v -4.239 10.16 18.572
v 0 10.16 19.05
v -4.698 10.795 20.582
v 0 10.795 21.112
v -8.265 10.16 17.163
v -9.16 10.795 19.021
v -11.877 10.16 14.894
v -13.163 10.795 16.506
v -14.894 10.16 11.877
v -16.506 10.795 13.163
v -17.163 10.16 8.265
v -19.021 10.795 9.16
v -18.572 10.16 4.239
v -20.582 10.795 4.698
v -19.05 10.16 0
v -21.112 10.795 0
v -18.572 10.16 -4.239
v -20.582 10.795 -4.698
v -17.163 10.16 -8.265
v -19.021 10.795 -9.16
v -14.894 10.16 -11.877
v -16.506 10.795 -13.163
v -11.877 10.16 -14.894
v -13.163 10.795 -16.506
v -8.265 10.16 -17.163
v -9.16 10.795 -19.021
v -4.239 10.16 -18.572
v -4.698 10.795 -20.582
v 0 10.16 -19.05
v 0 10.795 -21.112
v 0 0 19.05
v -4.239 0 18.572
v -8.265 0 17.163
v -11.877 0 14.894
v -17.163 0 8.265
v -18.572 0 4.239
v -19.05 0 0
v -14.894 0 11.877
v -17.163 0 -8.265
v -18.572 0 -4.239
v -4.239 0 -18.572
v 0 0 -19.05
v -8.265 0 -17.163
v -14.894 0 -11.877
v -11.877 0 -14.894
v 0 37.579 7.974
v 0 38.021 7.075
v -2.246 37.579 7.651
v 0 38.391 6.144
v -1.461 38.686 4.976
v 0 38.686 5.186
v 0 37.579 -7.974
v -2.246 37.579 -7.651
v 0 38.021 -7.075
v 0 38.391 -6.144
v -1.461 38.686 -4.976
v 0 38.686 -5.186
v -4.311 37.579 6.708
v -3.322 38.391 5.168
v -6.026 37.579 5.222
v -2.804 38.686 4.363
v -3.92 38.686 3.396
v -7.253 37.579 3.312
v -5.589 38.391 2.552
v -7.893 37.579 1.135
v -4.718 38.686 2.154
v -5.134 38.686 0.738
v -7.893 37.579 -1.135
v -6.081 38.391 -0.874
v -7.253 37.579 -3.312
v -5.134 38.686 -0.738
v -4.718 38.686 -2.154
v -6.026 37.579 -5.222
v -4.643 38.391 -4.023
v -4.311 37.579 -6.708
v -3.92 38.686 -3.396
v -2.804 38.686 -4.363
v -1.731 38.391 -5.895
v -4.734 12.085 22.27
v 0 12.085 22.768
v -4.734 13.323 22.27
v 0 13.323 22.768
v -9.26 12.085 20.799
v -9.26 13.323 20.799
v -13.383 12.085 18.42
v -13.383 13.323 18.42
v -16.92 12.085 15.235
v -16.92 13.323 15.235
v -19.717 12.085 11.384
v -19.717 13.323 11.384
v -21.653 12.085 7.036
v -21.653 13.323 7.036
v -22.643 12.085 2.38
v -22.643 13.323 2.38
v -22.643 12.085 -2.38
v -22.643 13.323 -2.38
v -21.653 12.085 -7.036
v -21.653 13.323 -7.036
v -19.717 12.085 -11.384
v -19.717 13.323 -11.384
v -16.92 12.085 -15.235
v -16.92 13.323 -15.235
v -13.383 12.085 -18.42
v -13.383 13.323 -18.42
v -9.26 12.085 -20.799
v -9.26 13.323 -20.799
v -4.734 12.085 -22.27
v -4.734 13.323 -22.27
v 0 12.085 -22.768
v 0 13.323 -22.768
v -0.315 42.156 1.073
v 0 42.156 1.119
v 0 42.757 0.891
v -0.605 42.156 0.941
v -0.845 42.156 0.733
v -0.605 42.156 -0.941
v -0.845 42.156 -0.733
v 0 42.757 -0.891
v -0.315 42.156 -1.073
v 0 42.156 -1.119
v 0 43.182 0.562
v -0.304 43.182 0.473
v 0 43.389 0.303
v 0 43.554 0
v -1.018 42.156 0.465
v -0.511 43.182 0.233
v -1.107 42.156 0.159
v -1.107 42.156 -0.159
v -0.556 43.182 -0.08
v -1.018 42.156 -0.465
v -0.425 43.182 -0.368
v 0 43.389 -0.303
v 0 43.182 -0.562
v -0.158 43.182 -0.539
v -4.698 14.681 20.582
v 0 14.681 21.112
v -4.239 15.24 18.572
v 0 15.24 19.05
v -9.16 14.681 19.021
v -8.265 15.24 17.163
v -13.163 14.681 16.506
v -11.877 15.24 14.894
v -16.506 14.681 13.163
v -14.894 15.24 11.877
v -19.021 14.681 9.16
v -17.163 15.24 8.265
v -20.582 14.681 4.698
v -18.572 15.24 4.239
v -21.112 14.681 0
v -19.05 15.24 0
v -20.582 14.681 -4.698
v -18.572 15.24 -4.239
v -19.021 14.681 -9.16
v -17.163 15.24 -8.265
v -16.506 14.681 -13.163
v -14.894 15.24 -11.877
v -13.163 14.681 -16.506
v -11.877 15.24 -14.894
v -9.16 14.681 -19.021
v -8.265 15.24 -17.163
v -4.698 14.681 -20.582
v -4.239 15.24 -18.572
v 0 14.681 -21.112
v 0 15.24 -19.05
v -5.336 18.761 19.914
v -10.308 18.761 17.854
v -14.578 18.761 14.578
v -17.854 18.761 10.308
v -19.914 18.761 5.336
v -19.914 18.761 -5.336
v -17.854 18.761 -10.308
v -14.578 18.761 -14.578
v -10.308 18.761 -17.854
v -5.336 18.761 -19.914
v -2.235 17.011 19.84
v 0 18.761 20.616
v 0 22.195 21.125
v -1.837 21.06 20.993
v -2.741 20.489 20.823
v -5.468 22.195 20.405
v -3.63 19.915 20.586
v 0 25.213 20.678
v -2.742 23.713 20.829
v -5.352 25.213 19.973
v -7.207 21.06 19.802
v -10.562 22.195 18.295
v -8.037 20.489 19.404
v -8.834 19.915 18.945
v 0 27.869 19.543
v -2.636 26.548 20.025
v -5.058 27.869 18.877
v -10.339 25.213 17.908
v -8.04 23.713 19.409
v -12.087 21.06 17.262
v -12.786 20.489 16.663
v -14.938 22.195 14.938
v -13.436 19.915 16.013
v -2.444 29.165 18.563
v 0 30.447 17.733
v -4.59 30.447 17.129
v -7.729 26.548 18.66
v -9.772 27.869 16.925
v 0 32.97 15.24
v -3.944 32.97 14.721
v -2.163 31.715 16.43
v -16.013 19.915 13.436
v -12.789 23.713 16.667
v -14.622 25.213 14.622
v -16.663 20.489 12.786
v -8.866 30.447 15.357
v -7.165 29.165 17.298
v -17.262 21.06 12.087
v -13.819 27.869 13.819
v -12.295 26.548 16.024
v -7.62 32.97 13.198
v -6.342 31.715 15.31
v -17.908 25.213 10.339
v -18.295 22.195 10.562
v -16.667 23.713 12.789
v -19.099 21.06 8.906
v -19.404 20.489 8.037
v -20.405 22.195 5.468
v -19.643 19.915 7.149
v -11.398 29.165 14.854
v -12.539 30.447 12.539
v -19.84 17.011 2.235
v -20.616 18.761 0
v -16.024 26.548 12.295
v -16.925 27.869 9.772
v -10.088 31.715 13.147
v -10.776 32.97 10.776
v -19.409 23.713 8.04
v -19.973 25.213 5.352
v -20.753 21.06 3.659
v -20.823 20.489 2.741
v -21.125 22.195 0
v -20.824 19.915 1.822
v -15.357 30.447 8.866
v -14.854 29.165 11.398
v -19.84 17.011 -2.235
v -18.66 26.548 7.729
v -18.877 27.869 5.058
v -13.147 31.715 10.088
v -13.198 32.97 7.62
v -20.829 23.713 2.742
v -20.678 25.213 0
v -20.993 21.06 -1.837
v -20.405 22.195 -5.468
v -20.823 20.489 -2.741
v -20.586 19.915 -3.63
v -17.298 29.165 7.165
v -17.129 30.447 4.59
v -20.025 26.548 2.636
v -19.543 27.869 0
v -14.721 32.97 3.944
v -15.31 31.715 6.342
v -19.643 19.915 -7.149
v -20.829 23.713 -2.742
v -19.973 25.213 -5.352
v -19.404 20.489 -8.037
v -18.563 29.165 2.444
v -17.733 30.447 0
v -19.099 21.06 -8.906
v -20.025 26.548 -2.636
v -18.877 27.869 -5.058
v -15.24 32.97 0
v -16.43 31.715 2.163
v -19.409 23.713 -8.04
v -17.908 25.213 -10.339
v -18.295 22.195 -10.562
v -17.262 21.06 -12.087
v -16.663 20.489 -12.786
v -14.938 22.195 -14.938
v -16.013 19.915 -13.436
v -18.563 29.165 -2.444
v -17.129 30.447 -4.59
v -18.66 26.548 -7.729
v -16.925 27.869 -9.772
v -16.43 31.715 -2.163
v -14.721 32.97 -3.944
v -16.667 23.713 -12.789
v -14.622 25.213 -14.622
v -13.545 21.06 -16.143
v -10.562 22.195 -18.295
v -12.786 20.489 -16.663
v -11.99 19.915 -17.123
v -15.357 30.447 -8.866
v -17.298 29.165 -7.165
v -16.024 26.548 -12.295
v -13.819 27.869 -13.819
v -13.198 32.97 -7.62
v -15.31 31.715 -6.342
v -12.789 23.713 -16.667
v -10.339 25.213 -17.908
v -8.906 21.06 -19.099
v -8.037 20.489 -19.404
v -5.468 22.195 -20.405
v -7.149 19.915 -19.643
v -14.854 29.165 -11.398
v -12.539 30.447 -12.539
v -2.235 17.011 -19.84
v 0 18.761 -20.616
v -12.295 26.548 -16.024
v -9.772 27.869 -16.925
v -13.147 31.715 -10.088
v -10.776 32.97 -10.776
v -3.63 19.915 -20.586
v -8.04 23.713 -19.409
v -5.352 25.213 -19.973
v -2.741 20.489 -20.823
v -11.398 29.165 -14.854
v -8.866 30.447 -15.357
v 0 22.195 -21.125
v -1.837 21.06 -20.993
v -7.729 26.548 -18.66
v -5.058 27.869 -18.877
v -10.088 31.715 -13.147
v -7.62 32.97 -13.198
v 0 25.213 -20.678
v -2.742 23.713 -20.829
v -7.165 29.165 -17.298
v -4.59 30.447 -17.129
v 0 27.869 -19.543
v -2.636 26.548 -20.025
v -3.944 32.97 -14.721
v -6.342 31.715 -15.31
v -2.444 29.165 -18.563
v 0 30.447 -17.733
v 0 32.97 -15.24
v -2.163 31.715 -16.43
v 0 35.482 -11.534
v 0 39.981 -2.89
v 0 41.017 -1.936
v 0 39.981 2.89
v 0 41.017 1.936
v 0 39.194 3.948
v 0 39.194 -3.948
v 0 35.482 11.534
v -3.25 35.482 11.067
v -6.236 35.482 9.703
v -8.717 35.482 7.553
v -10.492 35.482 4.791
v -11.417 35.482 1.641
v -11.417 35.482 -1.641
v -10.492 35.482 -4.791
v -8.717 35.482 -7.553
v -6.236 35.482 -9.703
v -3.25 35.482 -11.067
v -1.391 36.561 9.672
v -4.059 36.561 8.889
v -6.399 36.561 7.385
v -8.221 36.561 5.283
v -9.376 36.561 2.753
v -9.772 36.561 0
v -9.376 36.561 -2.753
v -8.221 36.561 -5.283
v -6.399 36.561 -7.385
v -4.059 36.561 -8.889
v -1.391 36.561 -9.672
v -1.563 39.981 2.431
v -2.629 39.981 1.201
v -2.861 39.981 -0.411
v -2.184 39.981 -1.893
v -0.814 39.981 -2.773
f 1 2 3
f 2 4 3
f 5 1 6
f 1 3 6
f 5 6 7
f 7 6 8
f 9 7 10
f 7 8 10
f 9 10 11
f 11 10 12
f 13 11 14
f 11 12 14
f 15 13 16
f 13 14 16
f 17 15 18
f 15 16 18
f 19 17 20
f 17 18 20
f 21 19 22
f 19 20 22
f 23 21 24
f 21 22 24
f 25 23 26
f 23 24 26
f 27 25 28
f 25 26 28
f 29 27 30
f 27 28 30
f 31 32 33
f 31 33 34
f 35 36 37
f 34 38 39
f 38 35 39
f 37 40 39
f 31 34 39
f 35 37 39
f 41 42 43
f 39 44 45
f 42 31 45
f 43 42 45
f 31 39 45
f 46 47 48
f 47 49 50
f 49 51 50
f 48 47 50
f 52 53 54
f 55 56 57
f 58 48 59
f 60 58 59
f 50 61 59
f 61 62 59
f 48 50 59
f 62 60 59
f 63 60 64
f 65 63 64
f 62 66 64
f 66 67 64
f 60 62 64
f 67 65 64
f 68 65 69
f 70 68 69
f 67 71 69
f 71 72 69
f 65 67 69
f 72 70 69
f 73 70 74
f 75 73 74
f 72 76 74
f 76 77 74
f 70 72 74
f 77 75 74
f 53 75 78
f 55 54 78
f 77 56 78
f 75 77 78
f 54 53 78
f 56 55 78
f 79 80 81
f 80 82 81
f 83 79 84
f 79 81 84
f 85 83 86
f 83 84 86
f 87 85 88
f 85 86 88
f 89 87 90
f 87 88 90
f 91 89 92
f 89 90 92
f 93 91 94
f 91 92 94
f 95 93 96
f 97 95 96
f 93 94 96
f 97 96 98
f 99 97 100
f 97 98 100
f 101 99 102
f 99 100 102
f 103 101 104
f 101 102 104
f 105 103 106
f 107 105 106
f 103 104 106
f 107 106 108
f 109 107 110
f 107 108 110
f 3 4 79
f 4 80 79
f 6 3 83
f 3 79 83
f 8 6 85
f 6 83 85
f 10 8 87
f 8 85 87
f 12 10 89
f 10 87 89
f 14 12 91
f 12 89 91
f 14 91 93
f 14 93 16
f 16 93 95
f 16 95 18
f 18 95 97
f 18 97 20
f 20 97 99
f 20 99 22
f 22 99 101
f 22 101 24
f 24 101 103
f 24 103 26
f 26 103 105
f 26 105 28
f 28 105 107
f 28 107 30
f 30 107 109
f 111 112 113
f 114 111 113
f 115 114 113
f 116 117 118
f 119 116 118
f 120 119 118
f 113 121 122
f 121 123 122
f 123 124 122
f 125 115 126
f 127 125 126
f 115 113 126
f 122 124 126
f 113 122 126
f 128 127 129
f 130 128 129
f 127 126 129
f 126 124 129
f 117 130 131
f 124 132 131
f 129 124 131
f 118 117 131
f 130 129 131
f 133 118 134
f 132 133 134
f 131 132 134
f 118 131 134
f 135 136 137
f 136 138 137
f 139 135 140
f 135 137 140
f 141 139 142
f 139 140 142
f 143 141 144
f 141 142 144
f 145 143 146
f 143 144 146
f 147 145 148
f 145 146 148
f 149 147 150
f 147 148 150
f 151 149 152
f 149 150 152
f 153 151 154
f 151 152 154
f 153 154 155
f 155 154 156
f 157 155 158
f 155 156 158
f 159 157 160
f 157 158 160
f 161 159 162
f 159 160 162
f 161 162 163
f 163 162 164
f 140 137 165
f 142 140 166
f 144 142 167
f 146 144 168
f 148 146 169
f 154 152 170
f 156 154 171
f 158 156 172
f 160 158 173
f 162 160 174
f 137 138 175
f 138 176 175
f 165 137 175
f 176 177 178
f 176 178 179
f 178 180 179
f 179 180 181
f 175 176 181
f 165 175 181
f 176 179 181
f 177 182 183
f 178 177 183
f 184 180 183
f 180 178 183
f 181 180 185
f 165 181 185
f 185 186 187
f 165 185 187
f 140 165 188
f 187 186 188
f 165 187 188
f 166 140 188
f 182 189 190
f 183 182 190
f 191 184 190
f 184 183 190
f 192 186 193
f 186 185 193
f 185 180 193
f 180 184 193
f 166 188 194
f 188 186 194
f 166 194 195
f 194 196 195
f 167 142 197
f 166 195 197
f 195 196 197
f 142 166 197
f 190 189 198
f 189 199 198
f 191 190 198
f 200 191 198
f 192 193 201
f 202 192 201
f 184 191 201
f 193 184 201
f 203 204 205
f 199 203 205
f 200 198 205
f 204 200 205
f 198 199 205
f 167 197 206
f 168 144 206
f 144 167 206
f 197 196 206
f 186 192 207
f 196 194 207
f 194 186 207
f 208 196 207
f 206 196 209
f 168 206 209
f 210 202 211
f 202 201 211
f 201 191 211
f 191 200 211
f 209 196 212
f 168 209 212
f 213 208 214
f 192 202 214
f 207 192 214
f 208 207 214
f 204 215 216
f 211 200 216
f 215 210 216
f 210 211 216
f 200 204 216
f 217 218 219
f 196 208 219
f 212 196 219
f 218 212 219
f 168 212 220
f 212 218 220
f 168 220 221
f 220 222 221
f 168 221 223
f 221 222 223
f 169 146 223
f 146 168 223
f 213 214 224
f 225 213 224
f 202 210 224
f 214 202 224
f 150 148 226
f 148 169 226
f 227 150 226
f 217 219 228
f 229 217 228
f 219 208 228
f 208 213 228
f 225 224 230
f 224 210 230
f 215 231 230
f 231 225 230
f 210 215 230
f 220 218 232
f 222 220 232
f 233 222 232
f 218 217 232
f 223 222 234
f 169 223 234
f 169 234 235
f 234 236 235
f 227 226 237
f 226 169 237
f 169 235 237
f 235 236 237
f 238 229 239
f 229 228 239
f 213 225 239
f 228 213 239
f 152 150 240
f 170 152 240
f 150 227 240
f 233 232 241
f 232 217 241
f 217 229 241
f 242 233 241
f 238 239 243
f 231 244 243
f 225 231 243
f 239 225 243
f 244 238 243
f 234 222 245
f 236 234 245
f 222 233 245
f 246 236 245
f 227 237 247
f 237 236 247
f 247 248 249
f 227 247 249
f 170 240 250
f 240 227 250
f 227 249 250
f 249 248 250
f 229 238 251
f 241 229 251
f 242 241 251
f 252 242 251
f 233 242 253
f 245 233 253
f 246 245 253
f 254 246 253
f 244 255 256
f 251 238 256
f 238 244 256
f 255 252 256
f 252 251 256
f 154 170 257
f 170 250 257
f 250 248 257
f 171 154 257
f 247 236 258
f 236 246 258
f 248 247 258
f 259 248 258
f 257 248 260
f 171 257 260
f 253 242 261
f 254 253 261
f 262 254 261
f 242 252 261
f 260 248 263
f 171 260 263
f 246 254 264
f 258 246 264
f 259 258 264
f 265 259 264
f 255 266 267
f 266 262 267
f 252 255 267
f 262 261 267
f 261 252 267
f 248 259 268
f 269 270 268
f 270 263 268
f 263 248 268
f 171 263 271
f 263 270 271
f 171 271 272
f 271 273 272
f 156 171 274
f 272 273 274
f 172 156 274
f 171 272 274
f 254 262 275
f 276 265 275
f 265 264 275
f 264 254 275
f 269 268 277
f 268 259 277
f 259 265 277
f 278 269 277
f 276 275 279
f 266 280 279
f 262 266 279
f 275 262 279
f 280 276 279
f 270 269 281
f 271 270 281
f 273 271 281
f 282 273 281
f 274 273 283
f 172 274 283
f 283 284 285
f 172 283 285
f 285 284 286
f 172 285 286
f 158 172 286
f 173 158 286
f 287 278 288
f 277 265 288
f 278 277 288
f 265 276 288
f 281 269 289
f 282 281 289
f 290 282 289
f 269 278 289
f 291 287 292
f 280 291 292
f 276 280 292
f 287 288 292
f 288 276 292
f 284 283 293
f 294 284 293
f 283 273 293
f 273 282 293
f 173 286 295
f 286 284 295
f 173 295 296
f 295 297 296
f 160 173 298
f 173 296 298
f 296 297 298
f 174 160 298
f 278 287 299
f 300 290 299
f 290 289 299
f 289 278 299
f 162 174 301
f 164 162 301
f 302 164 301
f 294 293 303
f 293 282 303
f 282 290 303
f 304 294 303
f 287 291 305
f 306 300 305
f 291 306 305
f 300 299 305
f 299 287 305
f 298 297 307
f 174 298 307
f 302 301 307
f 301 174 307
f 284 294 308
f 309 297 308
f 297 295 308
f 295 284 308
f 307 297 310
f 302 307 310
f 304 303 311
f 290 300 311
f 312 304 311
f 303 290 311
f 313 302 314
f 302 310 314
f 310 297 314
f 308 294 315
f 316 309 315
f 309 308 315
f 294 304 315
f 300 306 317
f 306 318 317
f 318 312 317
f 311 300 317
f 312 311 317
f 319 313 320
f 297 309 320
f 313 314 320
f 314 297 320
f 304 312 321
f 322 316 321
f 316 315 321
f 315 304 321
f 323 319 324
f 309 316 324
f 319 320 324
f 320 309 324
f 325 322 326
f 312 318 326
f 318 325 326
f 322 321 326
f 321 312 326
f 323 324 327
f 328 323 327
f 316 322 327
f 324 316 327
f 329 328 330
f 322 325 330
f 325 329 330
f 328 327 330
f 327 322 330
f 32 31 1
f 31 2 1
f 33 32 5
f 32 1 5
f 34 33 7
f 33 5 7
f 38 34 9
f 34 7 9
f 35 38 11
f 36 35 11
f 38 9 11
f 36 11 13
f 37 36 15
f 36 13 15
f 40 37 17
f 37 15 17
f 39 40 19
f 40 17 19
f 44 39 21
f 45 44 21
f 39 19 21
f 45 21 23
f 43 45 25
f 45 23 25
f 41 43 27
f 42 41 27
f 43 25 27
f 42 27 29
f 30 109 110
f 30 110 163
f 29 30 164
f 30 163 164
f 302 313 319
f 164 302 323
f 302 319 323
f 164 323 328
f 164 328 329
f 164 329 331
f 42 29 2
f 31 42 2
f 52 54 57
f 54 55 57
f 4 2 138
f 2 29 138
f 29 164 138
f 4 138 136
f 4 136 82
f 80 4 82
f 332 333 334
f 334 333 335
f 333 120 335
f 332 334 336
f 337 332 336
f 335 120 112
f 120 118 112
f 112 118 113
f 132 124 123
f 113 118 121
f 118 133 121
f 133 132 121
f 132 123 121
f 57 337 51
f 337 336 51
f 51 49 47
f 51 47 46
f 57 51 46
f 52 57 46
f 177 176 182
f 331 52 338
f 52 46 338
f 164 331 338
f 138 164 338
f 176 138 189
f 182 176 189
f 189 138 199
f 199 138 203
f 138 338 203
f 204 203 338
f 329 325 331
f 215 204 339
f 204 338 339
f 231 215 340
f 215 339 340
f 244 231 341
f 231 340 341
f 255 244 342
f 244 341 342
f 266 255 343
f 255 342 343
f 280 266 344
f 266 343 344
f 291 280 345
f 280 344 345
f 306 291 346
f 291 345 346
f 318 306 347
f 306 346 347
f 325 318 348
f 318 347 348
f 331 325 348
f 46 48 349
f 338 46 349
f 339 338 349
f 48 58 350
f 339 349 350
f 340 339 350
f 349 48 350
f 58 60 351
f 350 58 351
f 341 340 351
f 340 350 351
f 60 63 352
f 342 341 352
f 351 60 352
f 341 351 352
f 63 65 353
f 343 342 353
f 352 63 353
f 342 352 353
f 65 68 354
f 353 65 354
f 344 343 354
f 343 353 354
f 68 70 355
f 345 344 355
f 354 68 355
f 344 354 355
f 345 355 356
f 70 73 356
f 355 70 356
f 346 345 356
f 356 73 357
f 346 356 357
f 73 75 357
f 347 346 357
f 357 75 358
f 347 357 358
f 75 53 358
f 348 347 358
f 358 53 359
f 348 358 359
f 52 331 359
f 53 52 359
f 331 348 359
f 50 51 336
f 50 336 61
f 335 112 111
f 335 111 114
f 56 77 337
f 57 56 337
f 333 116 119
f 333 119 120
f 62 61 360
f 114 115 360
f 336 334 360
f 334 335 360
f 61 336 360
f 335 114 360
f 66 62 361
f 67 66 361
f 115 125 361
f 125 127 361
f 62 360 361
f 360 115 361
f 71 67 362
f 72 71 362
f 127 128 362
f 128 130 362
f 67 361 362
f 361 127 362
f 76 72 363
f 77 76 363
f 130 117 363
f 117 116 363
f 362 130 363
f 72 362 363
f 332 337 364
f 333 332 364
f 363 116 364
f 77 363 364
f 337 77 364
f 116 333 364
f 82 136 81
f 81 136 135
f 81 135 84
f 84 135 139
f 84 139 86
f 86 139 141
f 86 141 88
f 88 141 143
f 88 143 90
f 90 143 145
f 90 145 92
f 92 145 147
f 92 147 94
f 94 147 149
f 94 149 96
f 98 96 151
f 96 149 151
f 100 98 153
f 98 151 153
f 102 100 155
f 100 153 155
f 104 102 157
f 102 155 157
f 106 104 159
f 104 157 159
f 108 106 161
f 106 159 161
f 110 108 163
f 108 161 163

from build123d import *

# Parameters (mm, degrees)
REVOLVE1_ANGLE = 180


with BuildPart() as part:
    # Sketch4 → Revolve1 (revolve)
    with BuildSketch(Plane(origin=(0, 0, 0), x_dir=(0, 0, -1), z_dir=(1, 0, 0))):
        with BuildLine():
            Line((0, 43.554228777), (0, 0))
            Line((0, 0), (-19.05, 0))
            Line((-19.05, 0), (-19.05, 10.16))
            Line((-19.05, 10.16), (-21.1117011, 10.795))
            Line((-21.1117011, 10.795), (-22.767765969, 12.084590197))
            Line((-22.767765969, 12.084590197), (-22.767765969, 13.323327865))
            Line((-22.767765969, 13.323327865), (-21.1117011, 14.680643181))
            Line((-21.1117011, 14.680643181), (-19.05, 15.24))
            add(Edge.make_bspline(
                [(-19.05, 15.24), (-24.619555557, 24.713120096), (-15.24, 32.969594186)],
                knots=[0, 0, 0, 1, 1, 1], degree=2))
            add(Edge.make_bspline(
                [(-15.24, 32.969594186), (-13.159056011, 34.466761199), (-10.754138268, 36.044746883), (-8.242416232, 37.433272674), (-7.973778325, 37.578839171)],
                knots=[0, 0, 0, 0, 0.730138174, 0.817134496, 0.817134496, 0.817134496, 0.817134496], degree=3))
            ThreePointArc((-7.973778325, 37.578839171), (-6.612881823, 38.215201507), (-5.186361227, 38.686407728))
            add(Edge.make_bspline(
                [(-5.186361227, 38.686407728), (-3.351057226, 39.150966228), (-2.104803263, 40.656792731), (-1.118621699, 42.156292635)],
                knots=[0, 0, 0, 0, 1, 1, 1, 1], degree=3))
            add(Edge.make_bspline(
                [(-1.118621699, 42.156292635), (-0.886078473, 43.158491049), (0, 43.554228777)],
                knots=[0, 0, 0, 1, 1, 1], degree=2))
        make_face()
    revolve(axis=Axis((0, 43.554228777, 0), (0, -1, 0)), revolution_arc=REVOLVE1_ANGLE)


solid = part.part
